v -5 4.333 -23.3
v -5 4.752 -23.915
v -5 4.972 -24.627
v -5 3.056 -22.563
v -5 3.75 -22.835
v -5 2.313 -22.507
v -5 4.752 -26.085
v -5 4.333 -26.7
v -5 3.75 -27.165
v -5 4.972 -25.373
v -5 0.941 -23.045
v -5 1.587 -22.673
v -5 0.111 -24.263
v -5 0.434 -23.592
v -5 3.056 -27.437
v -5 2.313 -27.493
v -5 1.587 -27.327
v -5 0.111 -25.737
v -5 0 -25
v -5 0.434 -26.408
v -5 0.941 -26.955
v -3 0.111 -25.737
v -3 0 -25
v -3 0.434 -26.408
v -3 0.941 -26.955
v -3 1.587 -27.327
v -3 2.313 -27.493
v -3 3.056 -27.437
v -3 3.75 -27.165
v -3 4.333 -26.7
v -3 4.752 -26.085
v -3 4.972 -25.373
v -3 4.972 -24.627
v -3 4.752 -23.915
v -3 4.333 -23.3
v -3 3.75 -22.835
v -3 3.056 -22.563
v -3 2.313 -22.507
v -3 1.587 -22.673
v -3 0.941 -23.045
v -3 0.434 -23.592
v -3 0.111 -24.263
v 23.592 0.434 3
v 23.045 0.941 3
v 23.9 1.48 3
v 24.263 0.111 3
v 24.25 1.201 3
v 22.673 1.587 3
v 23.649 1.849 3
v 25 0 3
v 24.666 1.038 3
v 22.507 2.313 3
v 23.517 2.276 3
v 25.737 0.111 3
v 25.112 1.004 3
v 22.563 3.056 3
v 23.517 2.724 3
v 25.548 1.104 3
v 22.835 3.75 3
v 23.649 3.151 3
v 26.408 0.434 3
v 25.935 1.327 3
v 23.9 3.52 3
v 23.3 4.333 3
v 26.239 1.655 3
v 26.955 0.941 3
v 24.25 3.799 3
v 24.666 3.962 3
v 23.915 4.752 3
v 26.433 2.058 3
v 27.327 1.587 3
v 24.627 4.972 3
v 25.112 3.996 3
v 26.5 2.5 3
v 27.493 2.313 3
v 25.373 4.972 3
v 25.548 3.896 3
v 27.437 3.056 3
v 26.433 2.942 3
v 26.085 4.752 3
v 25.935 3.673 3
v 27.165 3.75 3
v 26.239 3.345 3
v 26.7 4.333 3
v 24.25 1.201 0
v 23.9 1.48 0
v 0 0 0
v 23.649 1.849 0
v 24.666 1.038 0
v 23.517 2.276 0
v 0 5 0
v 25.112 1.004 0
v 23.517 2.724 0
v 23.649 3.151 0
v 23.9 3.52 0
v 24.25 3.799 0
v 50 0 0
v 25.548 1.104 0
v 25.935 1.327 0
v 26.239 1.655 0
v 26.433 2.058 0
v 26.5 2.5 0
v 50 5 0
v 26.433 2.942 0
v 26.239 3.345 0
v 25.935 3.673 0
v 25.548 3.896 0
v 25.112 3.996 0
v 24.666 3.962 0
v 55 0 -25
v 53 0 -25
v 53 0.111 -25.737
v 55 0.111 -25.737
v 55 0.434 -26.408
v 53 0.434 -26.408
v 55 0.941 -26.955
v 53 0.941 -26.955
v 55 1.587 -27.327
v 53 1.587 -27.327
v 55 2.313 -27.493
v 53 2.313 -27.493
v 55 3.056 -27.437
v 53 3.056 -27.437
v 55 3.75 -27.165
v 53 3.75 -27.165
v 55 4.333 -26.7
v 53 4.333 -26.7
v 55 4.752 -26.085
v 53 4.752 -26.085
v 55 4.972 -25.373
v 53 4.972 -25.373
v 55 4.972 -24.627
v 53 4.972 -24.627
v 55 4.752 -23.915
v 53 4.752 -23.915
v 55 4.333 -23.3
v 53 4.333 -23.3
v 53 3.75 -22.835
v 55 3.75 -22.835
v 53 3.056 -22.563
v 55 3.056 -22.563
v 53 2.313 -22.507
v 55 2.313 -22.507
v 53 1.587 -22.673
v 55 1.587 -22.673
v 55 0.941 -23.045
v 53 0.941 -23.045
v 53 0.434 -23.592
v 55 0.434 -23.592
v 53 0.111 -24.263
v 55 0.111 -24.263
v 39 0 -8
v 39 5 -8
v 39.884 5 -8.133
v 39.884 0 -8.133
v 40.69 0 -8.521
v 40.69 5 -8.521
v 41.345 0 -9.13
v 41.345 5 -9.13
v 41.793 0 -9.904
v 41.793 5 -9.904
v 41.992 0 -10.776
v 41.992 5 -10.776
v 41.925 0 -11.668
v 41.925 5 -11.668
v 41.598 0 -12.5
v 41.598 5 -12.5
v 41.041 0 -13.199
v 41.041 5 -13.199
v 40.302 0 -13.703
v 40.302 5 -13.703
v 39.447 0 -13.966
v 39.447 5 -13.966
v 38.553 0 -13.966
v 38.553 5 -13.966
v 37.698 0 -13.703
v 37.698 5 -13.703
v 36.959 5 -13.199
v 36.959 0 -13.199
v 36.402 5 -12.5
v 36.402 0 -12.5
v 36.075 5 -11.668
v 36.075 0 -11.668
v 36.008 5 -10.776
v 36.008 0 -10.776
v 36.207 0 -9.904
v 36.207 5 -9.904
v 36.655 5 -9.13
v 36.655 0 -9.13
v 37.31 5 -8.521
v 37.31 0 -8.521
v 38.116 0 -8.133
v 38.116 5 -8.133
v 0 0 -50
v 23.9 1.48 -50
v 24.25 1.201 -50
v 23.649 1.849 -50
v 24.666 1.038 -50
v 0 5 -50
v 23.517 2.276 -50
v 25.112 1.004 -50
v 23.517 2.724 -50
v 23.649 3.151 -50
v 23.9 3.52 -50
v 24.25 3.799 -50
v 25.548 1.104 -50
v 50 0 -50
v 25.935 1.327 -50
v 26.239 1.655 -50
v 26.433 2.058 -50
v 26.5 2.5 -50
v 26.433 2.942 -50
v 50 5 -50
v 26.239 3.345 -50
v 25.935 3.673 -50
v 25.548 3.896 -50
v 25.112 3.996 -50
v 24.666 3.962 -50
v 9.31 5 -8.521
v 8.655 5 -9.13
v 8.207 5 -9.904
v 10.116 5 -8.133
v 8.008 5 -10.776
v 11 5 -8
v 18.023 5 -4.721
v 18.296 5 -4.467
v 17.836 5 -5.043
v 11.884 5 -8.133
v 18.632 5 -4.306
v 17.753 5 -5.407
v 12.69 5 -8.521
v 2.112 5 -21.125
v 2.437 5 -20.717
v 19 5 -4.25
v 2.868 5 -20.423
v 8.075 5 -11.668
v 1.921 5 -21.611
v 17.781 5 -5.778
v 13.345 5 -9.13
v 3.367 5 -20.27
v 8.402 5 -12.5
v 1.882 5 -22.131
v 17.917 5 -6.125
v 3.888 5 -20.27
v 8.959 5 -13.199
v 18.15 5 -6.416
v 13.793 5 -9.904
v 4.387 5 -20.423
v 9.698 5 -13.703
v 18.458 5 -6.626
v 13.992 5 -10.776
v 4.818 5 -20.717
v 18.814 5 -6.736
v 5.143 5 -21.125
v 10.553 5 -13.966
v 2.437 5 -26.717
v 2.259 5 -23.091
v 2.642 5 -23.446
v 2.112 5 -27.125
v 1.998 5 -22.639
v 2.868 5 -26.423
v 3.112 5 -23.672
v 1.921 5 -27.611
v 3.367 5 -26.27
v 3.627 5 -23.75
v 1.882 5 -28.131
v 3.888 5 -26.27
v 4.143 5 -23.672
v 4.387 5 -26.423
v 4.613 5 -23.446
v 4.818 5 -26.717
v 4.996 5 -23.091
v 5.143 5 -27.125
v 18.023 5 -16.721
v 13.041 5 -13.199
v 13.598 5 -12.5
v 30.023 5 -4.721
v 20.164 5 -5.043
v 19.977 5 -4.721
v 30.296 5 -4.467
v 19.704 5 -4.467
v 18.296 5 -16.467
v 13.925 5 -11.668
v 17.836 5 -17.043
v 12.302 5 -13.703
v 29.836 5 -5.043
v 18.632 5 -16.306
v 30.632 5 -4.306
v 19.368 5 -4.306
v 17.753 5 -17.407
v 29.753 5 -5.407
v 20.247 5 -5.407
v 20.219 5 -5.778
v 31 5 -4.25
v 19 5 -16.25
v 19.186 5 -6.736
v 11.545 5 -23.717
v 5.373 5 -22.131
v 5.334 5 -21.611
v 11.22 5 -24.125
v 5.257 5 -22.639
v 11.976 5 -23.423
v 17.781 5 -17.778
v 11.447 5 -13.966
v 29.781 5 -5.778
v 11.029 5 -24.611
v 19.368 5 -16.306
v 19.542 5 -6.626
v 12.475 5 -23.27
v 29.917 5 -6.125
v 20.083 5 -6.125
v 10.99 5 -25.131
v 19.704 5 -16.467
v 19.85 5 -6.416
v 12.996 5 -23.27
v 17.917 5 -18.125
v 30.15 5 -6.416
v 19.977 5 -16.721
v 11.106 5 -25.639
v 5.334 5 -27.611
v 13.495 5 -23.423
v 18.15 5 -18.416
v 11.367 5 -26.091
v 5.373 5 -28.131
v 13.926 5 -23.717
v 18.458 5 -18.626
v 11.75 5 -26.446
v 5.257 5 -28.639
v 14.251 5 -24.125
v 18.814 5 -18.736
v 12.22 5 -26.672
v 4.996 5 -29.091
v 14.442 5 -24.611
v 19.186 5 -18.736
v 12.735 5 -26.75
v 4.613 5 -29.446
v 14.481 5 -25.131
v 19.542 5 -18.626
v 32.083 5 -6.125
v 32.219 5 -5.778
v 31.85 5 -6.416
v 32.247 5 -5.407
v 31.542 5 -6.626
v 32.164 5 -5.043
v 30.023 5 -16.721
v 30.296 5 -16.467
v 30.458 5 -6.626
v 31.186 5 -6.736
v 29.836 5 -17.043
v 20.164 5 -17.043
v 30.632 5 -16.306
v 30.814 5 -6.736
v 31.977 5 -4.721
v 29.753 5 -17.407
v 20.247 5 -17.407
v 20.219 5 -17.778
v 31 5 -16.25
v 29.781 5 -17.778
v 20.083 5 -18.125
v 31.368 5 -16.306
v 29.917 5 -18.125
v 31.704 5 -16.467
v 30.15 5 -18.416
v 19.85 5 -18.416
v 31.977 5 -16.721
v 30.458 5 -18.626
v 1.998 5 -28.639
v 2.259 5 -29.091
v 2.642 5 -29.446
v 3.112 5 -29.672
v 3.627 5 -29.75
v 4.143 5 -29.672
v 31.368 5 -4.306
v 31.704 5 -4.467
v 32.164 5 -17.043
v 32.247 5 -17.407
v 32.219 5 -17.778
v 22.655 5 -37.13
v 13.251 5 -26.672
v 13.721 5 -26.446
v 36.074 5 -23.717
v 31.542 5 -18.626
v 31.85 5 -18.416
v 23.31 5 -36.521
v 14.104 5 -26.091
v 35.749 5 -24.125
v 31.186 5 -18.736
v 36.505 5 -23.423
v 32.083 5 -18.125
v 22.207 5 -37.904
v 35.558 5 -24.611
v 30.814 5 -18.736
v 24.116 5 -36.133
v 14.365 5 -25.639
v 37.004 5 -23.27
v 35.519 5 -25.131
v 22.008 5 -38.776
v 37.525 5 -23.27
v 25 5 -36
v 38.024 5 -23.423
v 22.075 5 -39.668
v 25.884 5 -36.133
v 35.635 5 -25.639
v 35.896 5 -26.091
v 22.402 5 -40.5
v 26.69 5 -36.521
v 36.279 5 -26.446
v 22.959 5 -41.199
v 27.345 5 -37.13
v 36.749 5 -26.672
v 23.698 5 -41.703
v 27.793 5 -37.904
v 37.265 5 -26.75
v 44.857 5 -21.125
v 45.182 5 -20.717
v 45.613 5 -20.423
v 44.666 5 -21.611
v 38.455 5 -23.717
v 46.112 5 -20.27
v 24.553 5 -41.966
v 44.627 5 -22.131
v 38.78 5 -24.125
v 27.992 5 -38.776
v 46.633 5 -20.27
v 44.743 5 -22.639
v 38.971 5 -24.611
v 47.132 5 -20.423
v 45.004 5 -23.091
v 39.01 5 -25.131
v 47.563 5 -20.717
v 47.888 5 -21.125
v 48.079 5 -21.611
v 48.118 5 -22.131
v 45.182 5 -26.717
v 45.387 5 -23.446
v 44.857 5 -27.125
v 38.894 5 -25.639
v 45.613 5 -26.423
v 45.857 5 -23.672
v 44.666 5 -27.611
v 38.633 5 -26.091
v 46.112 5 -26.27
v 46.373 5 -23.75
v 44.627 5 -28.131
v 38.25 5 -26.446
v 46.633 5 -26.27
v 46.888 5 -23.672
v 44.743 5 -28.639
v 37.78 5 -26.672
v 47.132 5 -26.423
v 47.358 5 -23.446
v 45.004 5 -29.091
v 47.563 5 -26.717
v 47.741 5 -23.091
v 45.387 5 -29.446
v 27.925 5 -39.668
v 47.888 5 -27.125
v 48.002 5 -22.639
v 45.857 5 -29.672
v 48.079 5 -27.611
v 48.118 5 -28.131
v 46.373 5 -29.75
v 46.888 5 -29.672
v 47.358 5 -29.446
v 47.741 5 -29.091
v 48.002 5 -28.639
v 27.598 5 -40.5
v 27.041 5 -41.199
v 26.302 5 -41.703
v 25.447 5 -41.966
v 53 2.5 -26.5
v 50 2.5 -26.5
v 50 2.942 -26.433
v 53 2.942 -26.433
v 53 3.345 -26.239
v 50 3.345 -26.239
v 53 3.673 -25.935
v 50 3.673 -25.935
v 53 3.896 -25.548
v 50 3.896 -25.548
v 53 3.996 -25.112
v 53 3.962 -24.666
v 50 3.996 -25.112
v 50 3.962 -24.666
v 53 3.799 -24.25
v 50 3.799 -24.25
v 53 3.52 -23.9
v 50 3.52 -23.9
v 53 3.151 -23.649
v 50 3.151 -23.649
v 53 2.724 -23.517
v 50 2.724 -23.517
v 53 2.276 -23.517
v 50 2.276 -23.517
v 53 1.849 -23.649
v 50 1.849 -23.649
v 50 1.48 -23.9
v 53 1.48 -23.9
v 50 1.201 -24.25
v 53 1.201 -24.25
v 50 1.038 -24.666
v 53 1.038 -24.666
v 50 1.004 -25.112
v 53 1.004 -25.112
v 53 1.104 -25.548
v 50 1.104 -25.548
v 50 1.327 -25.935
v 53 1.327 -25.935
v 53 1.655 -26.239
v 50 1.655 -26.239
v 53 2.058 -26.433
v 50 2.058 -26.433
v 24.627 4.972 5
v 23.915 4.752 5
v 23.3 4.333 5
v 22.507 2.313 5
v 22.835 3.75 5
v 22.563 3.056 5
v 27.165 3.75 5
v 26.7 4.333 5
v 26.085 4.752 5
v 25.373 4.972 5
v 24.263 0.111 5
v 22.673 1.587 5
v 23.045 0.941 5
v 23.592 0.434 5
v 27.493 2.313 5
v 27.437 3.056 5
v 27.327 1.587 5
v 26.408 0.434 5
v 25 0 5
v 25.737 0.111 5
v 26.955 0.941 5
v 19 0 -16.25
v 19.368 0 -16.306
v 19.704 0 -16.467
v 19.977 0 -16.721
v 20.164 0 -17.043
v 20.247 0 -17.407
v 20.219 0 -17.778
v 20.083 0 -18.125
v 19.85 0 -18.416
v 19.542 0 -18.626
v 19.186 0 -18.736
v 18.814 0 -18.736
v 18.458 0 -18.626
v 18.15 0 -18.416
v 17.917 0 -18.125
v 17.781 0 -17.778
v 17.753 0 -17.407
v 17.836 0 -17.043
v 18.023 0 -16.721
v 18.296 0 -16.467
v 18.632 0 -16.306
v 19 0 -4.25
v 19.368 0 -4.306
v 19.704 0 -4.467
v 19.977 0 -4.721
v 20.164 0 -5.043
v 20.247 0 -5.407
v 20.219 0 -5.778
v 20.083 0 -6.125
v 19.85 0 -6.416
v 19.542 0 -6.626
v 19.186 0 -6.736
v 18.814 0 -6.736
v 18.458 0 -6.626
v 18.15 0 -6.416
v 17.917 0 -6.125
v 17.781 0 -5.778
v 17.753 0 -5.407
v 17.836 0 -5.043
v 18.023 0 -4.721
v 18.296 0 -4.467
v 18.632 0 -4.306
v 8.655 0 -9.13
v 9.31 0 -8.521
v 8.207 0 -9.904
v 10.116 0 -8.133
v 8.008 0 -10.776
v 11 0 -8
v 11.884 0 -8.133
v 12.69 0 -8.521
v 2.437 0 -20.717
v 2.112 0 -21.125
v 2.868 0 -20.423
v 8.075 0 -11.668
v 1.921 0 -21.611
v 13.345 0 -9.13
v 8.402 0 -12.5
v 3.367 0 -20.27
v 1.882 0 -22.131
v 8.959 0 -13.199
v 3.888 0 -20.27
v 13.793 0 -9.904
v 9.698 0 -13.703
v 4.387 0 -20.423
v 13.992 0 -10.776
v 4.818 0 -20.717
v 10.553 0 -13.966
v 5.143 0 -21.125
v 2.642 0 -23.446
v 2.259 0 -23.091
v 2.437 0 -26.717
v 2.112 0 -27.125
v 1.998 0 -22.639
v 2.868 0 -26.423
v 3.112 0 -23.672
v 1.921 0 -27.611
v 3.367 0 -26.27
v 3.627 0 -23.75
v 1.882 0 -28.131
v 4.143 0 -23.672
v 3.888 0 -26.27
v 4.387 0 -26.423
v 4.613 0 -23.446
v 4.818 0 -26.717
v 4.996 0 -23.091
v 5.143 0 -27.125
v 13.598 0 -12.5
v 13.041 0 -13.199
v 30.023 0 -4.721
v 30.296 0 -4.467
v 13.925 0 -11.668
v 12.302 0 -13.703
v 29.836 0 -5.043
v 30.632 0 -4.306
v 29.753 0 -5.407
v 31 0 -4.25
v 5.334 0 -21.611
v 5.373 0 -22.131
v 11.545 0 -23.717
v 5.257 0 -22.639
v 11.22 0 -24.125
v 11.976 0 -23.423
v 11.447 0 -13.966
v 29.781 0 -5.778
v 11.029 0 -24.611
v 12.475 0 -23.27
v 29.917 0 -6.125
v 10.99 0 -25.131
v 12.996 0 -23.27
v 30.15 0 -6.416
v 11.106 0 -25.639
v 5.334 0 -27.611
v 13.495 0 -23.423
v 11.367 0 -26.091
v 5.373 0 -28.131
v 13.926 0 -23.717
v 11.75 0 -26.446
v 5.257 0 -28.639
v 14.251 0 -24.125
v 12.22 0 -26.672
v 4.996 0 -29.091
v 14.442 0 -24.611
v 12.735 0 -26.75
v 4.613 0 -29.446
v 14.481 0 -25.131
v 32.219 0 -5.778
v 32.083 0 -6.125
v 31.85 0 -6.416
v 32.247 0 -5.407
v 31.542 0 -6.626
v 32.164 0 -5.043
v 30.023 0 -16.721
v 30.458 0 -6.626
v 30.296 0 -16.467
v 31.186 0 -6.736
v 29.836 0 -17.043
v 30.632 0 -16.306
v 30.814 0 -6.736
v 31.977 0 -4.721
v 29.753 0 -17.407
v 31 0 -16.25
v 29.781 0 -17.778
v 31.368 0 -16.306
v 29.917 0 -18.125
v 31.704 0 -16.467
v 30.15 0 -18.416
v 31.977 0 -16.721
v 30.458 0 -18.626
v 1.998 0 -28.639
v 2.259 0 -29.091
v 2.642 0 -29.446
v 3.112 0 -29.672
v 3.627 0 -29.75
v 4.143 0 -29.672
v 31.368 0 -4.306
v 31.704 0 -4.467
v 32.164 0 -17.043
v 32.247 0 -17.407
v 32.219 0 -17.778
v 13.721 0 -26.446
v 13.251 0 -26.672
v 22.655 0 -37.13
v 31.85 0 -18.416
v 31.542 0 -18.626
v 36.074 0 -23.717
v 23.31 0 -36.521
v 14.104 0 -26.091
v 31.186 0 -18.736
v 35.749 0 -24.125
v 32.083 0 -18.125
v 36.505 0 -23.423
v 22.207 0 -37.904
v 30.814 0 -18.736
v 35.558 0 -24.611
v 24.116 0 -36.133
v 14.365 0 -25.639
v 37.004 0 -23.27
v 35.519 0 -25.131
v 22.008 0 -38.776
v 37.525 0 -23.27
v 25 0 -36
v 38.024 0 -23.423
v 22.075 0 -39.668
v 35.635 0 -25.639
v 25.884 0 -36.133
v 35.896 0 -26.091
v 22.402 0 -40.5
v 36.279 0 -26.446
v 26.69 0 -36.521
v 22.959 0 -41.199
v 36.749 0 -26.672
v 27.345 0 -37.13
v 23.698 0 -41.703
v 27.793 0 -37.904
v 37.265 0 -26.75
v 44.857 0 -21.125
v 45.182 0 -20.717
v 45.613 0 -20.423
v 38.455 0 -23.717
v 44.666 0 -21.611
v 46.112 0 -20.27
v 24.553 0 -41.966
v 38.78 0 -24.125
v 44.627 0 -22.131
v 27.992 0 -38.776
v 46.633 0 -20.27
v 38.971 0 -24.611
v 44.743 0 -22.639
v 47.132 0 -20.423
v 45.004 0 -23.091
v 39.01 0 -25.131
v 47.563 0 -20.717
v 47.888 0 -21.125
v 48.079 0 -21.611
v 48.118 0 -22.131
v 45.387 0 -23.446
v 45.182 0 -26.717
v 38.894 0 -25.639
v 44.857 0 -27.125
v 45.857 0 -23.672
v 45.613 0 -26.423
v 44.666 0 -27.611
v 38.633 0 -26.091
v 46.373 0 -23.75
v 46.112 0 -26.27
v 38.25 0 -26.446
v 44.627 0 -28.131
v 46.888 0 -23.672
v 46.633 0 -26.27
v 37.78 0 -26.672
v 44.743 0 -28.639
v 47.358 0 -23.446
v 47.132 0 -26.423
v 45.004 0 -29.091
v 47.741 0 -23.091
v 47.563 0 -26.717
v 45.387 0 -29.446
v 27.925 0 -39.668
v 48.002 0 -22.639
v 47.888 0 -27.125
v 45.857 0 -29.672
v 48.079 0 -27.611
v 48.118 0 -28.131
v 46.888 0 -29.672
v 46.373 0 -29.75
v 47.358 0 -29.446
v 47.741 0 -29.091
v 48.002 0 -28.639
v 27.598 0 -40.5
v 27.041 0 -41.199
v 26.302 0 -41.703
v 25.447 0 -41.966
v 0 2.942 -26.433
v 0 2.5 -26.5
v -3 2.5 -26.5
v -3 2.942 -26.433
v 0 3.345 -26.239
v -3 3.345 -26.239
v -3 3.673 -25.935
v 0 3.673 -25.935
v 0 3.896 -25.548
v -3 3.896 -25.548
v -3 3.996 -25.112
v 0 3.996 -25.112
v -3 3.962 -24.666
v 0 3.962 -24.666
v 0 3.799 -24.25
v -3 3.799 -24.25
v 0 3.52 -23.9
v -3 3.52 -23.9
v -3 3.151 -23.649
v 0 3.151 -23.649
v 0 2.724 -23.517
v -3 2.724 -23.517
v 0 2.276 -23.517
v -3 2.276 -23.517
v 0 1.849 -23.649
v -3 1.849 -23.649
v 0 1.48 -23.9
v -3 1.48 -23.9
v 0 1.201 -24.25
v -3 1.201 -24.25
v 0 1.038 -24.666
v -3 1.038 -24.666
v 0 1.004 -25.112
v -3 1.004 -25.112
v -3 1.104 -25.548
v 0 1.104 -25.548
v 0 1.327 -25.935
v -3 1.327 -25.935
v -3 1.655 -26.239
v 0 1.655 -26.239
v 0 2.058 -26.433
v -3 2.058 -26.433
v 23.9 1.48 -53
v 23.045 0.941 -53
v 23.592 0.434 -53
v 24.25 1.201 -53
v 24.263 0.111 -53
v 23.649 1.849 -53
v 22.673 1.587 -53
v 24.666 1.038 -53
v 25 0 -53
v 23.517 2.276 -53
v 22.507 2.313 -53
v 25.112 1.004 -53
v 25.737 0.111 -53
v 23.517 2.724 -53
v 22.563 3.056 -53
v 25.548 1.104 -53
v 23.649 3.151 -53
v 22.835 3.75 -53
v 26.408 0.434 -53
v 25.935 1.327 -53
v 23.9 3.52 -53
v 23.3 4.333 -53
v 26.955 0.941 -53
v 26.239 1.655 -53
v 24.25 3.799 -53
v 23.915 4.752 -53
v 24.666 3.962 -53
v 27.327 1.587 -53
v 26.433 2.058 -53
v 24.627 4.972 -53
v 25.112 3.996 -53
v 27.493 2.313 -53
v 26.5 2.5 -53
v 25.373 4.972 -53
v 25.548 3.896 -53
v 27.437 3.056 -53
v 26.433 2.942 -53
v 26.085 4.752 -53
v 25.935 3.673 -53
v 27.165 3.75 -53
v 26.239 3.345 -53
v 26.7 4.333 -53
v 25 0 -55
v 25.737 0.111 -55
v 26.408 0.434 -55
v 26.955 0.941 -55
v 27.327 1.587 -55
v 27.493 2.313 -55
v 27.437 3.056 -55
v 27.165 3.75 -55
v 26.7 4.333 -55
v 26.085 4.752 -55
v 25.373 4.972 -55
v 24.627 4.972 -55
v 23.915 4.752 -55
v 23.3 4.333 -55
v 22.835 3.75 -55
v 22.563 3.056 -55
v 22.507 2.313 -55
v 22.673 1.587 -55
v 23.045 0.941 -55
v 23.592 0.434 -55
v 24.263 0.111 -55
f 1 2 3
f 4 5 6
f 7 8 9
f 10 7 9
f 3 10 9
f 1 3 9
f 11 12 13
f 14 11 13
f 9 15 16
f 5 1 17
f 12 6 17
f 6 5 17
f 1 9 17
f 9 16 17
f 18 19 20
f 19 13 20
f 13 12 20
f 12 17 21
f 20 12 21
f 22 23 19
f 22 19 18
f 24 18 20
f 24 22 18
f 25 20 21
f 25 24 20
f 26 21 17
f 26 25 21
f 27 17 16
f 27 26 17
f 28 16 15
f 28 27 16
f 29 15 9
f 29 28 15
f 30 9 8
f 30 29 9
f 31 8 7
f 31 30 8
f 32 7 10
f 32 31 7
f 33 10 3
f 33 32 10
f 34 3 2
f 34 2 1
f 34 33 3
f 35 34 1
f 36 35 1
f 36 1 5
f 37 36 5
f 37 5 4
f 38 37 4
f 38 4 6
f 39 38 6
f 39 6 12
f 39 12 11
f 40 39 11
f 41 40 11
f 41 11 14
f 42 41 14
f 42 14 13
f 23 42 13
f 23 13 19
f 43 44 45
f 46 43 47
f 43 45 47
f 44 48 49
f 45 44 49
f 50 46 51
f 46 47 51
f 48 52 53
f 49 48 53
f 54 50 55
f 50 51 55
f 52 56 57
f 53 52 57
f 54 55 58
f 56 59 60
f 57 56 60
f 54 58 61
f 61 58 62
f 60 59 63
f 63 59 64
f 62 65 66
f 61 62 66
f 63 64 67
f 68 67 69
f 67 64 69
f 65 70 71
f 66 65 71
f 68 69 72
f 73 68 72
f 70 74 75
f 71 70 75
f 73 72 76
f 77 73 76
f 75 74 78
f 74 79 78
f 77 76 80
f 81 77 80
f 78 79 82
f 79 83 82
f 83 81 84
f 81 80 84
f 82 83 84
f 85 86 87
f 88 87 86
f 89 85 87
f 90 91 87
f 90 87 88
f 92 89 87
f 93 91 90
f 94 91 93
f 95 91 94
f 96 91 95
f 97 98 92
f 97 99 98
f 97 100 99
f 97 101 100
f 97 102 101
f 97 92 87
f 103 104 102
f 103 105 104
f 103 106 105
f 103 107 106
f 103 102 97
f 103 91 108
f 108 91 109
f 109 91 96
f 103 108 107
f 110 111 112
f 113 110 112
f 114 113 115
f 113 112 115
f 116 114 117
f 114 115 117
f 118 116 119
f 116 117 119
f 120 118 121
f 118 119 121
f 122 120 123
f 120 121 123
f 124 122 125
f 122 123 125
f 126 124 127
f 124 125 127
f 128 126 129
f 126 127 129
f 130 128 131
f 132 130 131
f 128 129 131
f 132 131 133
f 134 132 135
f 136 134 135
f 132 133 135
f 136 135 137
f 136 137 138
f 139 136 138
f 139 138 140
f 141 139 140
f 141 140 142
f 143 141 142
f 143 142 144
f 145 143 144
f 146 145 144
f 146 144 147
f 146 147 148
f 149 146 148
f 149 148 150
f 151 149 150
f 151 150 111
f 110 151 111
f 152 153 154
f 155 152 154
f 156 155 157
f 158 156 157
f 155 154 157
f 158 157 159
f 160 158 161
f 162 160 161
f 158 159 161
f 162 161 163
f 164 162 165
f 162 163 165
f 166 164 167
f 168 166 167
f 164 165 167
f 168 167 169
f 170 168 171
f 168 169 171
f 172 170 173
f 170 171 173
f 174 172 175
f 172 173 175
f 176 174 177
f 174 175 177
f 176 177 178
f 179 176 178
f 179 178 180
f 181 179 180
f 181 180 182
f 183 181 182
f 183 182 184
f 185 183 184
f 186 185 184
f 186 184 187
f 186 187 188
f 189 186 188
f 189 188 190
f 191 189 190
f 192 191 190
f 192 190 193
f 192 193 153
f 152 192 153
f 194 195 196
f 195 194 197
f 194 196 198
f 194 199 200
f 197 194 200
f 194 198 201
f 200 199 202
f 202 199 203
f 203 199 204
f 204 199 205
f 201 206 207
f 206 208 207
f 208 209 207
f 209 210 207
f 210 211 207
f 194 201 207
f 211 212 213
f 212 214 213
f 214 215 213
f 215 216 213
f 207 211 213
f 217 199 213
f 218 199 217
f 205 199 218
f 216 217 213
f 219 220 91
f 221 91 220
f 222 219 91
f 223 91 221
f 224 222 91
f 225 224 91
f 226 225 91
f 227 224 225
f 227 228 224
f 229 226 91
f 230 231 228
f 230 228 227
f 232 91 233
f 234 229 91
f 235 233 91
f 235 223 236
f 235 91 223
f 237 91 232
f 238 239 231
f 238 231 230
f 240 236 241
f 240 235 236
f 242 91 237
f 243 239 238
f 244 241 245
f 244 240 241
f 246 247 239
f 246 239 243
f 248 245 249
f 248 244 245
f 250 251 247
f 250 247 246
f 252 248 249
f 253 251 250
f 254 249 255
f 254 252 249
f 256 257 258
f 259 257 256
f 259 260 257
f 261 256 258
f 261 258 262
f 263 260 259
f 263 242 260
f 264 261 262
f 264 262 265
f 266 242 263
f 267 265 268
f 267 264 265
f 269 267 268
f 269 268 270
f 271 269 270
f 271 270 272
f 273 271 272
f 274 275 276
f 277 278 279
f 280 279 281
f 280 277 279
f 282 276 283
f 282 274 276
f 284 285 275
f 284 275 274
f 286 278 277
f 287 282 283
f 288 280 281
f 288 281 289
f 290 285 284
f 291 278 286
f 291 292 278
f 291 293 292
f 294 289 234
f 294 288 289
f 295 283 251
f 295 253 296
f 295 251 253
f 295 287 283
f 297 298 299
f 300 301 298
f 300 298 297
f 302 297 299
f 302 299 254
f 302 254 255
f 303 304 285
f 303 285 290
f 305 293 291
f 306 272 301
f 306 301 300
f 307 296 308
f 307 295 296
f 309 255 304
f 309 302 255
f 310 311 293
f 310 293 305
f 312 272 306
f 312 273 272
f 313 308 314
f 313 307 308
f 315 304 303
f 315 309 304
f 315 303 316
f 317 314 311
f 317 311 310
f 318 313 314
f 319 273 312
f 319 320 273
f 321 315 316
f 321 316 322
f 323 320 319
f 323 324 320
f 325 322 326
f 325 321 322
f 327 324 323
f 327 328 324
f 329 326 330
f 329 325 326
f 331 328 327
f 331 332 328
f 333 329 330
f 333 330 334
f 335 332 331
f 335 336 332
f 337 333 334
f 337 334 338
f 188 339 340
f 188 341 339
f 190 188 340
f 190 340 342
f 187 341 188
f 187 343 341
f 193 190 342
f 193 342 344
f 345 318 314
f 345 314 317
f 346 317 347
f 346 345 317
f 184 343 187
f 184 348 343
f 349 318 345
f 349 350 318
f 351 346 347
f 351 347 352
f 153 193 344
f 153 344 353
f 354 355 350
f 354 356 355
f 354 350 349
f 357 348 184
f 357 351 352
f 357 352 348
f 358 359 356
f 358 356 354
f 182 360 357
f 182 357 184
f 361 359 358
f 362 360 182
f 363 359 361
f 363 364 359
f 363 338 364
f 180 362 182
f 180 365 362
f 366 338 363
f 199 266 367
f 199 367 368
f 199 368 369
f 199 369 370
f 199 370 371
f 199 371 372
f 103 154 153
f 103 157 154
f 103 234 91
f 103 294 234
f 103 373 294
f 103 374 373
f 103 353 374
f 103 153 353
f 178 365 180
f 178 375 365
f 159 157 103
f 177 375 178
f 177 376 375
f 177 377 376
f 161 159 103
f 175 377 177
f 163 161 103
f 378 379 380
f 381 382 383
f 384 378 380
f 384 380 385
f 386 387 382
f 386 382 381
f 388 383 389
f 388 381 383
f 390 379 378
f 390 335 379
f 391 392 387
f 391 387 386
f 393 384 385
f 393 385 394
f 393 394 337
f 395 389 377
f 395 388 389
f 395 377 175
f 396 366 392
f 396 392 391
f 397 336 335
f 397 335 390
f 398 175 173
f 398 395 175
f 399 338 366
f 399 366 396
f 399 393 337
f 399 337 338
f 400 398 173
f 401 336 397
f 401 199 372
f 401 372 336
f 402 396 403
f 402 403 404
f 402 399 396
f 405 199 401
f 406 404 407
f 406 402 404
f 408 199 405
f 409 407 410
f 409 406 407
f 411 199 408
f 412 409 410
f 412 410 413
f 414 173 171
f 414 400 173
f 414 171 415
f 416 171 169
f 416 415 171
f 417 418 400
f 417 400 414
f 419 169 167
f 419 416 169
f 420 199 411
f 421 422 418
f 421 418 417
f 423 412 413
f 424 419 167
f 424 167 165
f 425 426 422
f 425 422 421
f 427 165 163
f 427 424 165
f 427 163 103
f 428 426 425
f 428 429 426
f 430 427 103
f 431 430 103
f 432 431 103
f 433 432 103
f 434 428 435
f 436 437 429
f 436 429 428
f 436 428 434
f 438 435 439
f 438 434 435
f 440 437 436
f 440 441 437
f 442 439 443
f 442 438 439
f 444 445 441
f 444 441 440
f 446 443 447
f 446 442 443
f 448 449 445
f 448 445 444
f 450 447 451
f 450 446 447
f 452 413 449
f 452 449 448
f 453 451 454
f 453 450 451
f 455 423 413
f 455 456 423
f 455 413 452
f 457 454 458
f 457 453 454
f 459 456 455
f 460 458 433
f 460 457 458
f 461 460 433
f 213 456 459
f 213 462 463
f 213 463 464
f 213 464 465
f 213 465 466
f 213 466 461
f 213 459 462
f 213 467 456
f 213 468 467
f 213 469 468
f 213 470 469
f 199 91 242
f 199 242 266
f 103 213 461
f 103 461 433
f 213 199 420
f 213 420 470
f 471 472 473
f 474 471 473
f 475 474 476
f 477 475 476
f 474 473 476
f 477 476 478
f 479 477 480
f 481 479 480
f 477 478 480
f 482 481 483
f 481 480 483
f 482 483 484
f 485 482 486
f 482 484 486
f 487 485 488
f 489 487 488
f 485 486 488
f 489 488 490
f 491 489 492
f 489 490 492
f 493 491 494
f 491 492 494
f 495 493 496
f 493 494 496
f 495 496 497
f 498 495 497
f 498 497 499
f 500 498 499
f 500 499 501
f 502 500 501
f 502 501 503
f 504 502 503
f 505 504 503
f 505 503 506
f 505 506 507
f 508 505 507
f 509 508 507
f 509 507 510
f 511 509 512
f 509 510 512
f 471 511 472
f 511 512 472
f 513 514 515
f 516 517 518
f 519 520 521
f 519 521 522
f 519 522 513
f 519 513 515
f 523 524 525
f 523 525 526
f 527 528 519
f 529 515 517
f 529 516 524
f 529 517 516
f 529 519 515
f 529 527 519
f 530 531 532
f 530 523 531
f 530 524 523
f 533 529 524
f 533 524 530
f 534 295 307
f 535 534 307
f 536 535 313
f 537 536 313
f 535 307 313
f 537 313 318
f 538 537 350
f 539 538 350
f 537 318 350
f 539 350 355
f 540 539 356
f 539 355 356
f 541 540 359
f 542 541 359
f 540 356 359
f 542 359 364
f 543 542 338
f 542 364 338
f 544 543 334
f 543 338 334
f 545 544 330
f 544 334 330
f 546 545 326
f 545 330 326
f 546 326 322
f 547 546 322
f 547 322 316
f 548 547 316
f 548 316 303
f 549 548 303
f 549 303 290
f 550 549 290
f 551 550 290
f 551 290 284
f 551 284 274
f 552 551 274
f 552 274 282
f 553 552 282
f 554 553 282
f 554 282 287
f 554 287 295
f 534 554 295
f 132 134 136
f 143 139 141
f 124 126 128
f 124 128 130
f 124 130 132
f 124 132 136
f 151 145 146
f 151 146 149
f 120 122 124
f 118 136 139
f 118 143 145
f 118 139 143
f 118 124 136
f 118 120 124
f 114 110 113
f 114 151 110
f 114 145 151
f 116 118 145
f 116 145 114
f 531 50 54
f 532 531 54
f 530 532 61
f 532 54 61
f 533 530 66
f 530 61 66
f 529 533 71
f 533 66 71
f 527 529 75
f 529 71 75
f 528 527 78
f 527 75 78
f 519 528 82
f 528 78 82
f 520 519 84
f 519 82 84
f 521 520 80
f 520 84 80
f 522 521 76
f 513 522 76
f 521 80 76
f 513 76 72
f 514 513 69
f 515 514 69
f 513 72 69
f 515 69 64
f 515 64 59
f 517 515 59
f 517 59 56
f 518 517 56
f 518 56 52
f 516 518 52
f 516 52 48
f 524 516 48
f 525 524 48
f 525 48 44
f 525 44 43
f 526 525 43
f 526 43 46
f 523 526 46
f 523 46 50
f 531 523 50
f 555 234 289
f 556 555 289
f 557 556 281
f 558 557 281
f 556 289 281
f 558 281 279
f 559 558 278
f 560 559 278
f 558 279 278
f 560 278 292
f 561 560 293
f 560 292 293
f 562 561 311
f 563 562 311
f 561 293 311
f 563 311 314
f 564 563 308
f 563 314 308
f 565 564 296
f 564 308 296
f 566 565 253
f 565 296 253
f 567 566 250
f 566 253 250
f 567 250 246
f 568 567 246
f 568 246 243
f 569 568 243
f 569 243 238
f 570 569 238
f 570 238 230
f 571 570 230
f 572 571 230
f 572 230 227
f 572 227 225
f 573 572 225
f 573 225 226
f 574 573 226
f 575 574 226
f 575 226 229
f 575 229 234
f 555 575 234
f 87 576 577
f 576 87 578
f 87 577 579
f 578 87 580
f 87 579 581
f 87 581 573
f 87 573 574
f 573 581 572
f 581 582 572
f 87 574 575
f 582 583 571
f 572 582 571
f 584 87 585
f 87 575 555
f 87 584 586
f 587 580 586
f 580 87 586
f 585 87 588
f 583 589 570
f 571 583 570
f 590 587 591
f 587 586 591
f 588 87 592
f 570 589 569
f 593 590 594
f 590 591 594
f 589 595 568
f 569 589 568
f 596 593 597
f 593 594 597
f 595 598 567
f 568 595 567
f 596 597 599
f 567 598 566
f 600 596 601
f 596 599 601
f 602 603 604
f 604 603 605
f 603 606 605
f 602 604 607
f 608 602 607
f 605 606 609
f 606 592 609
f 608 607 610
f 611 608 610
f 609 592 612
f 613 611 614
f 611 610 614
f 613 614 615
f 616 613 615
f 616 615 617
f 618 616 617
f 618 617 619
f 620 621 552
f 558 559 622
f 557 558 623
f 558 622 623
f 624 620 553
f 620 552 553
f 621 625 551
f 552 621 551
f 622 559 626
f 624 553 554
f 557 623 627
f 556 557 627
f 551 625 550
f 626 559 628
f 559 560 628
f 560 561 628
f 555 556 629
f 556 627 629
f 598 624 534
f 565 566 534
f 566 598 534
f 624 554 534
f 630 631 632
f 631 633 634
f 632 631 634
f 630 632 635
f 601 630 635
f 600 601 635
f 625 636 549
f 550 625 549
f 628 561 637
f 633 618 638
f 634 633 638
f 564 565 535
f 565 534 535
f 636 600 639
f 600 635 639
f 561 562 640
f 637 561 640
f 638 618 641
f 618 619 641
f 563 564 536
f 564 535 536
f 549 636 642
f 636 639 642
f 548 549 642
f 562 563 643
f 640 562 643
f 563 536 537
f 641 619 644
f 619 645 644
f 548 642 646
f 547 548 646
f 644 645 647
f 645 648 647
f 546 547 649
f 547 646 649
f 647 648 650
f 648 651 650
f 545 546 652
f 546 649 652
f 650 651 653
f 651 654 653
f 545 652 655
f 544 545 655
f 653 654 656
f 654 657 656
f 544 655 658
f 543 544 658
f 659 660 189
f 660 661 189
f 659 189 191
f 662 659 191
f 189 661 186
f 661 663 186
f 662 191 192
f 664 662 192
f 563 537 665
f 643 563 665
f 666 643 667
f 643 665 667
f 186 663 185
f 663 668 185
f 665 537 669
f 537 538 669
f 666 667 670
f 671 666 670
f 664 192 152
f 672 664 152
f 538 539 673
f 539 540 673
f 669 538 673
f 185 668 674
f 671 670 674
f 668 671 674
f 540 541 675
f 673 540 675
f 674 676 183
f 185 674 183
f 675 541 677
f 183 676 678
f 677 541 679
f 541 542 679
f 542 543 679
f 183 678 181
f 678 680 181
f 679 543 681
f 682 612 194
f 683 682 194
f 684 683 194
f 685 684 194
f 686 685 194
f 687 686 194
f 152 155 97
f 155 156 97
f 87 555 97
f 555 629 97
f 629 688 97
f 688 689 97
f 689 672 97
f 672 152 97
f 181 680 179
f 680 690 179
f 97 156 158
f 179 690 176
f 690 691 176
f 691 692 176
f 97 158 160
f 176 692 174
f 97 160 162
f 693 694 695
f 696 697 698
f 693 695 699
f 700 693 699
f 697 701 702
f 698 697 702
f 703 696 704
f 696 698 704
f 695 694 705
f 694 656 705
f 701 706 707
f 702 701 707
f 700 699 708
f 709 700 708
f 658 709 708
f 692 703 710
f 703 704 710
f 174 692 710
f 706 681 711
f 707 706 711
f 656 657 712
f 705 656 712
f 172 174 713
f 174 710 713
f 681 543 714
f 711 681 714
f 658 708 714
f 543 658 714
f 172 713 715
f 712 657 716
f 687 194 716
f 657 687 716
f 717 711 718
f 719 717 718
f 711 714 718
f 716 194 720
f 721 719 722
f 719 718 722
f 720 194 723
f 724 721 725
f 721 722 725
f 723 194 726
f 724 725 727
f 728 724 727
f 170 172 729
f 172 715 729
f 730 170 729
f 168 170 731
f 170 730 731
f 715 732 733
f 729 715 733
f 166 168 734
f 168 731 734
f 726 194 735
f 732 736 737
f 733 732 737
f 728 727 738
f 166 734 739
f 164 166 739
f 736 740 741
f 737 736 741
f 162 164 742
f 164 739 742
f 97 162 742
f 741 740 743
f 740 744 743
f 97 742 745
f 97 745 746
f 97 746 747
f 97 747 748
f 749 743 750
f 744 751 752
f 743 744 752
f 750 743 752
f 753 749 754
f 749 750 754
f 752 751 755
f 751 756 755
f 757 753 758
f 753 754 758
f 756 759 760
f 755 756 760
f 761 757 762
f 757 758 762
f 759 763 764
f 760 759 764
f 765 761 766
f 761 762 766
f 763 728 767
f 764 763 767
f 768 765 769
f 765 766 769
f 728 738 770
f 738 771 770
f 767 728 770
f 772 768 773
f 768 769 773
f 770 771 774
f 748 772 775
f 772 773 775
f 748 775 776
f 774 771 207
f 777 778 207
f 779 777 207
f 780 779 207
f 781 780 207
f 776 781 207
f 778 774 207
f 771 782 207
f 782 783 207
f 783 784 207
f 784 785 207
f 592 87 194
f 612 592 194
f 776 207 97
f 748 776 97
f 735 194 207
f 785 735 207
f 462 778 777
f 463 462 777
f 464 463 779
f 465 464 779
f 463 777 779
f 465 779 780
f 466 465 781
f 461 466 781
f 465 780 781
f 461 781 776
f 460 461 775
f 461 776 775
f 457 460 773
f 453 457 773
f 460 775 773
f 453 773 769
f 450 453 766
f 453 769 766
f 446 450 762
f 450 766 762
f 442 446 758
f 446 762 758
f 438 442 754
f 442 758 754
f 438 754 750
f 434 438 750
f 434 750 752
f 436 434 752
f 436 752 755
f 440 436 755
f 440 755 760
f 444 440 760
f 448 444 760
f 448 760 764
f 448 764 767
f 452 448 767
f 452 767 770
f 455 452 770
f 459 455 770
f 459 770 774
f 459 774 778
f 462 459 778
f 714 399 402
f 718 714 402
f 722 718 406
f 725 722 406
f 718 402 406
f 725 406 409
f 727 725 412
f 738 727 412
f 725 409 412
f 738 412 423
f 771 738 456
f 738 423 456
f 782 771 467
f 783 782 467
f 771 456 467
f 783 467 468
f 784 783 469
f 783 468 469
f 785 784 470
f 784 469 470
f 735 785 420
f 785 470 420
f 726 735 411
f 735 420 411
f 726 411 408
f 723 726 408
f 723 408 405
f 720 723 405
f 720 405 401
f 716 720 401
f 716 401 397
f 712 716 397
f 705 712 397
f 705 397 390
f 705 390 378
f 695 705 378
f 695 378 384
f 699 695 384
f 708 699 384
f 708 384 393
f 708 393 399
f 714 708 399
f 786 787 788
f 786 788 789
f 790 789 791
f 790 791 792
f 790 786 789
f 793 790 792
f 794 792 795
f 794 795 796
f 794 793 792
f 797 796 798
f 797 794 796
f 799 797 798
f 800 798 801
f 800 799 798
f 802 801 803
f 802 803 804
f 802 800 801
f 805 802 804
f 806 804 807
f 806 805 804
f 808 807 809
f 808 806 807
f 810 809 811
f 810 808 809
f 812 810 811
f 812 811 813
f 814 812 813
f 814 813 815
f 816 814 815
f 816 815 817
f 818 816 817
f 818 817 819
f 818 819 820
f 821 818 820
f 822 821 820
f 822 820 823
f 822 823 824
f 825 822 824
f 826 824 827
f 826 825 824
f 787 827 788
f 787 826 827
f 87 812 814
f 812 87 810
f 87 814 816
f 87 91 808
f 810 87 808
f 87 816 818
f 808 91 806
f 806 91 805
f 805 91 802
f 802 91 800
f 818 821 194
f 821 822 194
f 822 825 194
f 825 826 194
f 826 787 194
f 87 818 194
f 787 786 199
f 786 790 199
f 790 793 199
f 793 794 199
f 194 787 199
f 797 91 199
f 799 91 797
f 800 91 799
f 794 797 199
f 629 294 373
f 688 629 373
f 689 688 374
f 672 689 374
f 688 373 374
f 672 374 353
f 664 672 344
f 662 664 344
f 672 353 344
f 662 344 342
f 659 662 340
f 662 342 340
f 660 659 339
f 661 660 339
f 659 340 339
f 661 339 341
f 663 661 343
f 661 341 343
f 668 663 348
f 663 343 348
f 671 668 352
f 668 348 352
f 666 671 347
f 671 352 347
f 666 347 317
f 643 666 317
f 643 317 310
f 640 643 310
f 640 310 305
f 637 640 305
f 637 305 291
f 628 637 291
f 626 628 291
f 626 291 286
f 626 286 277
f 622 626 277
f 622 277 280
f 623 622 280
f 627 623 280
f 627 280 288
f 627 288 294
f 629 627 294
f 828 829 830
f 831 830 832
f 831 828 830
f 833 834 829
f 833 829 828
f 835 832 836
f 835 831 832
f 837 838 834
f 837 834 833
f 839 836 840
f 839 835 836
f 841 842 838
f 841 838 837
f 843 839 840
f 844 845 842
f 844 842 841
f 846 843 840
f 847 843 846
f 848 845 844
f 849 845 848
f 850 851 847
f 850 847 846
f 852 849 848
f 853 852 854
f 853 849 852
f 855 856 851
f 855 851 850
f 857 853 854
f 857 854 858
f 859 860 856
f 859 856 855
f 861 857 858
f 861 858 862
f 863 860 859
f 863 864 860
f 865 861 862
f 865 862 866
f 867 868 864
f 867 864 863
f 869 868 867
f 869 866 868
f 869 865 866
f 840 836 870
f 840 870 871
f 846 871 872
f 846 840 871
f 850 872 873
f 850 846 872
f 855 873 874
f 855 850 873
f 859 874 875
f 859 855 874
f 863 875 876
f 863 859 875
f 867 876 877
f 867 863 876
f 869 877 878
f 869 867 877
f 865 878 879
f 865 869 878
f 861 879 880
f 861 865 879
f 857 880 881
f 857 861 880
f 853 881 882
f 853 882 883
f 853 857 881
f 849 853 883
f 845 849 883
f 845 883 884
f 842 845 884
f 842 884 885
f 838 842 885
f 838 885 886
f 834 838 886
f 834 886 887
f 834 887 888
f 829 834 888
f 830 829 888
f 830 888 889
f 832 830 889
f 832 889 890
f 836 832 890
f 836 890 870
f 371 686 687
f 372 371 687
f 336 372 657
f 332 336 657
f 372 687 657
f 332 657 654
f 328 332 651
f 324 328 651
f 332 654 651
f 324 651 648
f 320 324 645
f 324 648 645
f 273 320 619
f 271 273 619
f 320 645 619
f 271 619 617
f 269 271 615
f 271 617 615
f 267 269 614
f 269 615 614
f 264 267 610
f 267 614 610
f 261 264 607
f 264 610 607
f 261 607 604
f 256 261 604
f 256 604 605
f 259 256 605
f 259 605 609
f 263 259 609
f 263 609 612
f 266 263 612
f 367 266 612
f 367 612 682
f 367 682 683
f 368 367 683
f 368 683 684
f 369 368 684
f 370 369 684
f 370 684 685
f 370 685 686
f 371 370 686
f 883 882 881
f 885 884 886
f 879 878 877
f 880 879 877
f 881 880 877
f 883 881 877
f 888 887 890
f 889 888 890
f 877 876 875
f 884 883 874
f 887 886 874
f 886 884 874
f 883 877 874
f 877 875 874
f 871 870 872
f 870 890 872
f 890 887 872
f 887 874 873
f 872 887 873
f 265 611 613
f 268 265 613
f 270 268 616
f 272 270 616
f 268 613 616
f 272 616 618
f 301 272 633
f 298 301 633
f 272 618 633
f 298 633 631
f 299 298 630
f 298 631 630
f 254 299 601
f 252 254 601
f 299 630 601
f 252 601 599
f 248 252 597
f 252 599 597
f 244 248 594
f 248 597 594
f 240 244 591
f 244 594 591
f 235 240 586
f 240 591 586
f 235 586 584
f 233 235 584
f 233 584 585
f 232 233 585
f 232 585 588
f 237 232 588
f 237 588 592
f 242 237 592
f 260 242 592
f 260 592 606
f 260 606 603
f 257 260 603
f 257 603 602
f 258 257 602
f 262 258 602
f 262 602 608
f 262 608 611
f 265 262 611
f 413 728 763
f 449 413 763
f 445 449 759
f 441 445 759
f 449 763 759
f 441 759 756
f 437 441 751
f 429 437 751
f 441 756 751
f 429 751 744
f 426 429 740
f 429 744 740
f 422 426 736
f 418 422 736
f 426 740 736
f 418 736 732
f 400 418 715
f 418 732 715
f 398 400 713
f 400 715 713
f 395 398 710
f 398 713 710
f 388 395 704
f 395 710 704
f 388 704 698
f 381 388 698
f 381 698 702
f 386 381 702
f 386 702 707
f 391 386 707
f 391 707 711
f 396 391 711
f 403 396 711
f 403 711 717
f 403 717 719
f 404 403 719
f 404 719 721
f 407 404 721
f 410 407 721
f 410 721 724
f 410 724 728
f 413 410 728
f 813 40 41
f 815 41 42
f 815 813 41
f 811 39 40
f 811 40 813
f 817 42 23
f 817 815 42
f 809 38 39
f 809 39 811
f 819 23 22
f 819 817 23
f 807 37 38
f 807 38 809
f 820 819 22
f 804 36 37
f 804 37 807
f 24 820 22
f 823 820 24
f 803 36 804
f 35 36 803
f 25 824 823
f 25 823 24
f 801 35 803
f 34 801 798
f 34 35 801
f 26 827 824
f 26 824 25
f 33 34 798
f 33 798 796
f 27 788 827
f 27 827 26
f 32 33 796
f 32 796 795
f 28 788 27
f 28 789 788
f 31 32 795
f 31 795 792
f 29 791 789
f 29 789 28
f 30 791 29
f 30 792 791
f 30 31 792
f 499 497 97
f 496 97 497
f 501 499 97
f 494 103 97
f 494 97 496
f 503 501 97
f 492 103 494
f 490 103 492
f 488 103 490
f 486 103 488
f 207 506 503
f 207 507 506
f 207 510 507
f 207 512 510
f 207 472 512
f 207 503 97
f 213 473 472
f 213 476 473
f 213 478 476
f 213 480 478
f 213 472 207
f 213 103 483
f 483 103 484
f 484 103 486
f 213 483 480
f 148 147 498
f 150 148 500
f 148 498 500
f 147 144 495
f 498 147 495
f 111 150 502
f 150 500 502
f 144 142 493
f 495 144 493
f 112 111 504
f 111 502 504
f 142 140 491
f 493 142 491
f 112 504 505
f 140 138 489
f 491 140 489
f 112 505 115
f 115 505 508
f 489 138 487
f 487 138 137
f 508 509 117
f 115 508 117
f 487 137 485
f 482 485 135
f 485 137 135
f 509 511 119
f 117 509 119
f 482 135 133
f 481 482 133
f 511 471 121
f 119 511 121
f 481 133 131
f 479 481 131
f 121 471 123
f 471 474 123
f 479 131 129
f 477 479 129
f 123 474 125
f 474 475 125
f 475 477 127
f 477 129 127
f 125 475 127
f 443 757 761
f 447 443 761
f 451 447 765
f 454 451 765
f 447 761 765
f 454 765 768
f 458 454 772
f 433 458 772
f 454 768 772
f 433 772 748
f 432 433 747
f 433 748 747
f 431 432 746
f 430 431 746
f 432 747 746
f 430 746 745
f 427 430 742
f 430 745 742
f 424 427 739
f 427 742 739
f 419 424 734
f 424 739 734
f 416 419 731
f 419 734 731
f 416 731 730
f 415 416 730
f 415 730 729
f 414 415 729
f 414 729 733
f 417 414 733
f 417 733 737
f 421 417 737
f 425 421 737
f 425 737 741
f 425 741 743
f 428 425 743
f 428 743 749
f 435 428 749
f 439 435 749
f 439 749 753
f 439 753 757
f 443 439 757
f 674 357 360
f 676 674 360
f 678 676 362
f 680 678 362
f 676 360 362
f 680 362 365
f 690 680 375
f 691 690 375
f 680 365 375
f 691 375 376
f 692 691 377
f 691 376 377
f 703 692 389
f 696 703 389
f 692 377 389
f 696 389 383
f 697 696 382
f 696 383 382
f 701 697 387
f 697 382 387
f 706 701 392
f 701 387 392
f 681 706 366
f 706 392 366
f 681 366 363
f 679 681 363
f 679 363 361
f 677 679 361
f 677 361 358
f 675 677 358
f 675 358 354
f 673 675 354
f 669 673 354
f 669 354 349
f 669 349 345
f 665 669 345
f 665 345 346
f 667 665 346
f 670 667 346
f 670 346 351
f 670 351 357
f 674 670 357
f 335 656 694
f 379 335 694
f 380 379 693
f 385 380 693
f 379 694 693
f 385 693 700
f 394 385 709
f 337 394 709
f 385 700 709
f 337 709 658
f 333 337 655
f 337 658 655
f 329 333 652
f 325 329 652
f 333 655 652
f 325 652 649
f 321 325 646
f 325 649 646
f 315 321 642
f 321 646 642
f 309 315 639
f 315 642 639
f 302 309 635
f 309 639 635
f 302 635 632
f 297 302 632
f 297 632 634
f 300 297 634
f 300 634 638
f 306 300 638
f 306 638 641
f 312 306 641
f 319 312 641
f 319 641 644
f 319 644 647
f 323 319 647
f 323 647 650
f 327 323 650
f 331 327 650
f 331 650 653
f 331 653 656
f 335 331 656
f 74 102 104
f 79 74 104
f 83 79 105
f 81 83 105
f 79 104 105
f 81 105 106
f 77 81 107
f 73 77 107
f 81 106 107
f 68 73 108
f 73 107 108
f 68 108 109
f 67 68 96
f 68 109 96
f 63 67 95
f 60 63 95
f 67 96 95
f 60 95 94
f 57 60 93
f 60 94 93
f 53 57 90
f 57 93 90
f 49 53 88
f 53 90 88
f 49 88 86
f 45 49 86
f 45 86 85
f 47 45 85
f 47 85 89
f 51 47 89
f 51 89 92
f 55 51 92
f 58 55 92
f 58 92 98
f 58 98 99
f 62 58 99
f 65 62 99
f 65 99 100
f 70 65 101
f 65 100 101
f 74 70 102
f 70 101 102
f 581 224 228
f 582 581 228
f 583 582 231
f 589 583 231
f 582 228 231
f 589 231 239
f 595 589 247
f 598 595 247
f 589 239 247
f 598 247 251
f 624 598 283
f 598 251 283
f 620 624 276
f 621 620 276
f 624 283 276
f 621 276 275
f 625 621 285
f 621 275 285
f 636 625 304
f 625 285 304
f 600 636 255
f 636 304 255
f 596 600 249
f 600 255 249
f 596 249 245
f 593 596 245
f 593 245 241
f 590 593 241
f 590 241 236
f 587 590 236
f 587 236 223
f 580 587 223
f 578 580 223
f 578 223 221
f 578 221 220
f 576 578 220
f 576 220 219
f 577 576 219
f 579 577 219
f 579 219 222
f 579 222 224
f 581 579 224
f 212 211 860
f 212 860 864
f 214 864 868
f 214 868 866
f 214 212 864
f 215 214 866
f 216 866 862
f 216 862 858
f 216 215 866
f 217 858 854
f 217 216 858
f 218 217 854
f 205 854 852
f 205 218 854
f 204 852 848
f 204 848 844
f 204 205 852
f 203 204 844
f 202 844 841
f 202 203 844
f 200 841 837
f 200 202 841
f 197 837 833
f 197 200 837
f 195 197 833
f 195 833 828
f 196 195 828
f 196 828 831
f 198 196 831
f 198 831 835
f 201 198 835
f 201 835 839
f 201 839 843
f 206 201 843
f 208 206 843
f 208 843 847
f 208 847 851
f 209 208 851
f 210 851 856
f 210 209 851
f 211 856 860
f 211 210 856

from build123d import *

# Parameters (mm, degrees)
SKETCH_1_W          = 50
SKETCH_1_H          = 50
EXTRUDE_1_DEPTH     = 5
SKETCH_2_R          = 3
CUT_EXTRUDE_1_DEPTH = 71.887234394
SKETCH_3_R          = 1.25
CUT_EXTRUDE_2_DEPTH = 71.887234394
SKETCH_8_R          = 1.75
CUT_EXTRUDE_4_DEPTH = 71.887234394
SKETCH_9_R          = 2.5
EXTRUDE_2_DEPTH     = 5
SKETCH_10_R         = 2.5
SKETCH_10_R_2       = 1.5
CUT_EXTRUDE_5_DEPTH = 3
SKETCH_11_R         = 2.5
EXTRUDE_3_DEPTH     = 5
SKETCH_12_R         = 2.5
SKETCH_12_R_2       = 1.5
CUT_EXTRUDE_7_DEPTH = 3


with BuildPart() as part:
    # 草图1 → 凸台-拉伸1 (new body)
    with BuildSketch(Plane(origin=(0, 0, 0), x_dir=(1, 0, 0), z_dir=(0, 1, 0))):
        with Locations((25, 25)):
            Rectangle(SKETCH_1_W, SKETCH_1_H)
    extrude(amount=EXTRUDE_1_DEPTH)

    # 草图2 → 切除-拉伸1 (cut, through all)
    with BuildSketch(Plane(origin=(0, 5, 0), x_dir=(1, 0, 0), z_dir=(0, 1, 0))):
        with Locations(Location((25, 39, 0), (0, 0, 270))):
            Circle(SKETCH_2_R)
        with Locations(Location((11, 11, 0), (0, 0, 270))):
            Circle(SKETCH_2_R)
        with Locations(Location((39, 11, 0), (0, 0, 270))):
            Circle(SKETCH_2_R)
    extrude(amount=-CUT_EXTRUDE_1_DEPTH, mode=Mode.SUBTRACT)

    # 草图3 → 切除-拉伸2 (cut, through all)
    with BuildSketch(Plane(origin=(0, 5, 0), x_dir=(1, 0, 0), z_dir=(0, 1, 0))):
        with Locations(Location((19, 17.5, 0), (0, 0, 270))):
            Circle(SKETCH_3_R)
        with Locations(Location((31, 17.5, 0), (0, 0, 270))):
            Circle(SKETCH_3_R)
        with Locations(Location((19, 5.5, 0), (0, 0, 270))):
            Circle(SKETCH_3_R)
        with Locations(Location((31, 5.5, 0), (0, 0, 270))):
            Circle(SKETCH_3_R)
    extrude(amount=-CUT_EXTRUDE_2_DEPTH, mode=Mode.SUBTRACT)

    # 草图8 → 切除-拉伸4 (cut, through all)
    with BuildSketch(Plane.XZ):
        with Locations(Location((46.372516673, -22, 0), (0, 0, 270))):
            Circle(SKETCH_8_R)
        with Locations(Location((46.372516673, -28, 0), (0, 0, 270))):
            Circle(SKETCH_8_R)
        with Locations(Location((37.264513071, -25, 0), (0, 0, 270))):
            Circle(SKETCH_8_R)
        with Locations(Location((12.735486929, -25, 0), (0, 0, 270))):
            Circle(SKETCH_8_R)
        with Locations(Location((3.627483327, -28, 0), (0, 0, 270))):
            Circle(SKETCH_8_R)
        with Locations(Location((3.627483327, -22, 0), (0, 0, 270))):
            Circle(SKETCH_8_R)
    extrude(amount=-CUT_EXTRUDE_4_DEPTH, mode=Mode.SUBTRACT)

    # 草图9 → 凸台-拉伸2 (add)
    with BuildSketch(Plane.XY):
        with Locations(Location((25, 2.5, 0), (0, 0, 270))):
            Circle(SKETCH_9_R)
    extrude_2 = extrude(amount=EXTRUDE_2_DEPTH)

    # 草图10 → 切除-拉伸5 (cut)
    with BuildSketch(Plane.XY):
        with Locations((25, 2.5)):
            Circle(SKETCH_10_R)
        with Locations((25, 2.5)):
            Circle(SKETCH_10_R_2, mode=Mode.SUBTRACT)
    cut_extrude_5 = extrude(amount=CUT_EXTRUDE_5_DEPTH, mode=Mode.SUBTRACT)

    # 草图11 → 凸台-拉伸3 (add)
    with BuildSketch(Plane(origin=(50, 0, 0), x_dir=(0, 0, -1), z_dir=(1, 0, 0))):
        with Locations(Location((25, 2.5, 0), (0, 0, 270))):
            Circle(SKETCH_11_R)
    extrude_3 = extrude(amount=EXTRUDE_3_DEPTH)

    # 草图12 → 切除-拉伸7 (cut)
    with BuildSketch(Plane(origin=(50, 0, 0), x_dir=(0, 0, -1), z_dir=(1, 0, 0))):
        with Locations((25, 2.5)):
            Circle(SKETCH_12_R)
        with Locations((25, 2.5)):
            Circle(SKETCH_12_R_2, mode=Mode.SUBTRACT)
    cut_extrude_7 = extrude(amount=CUT_EXTRUDE_7_DEPTH, mode=Mode.SUBTRACT)

    # 镜向1: 凸台-拉伸3, 切除-拉伸7 across plane
    add(extrude_3.mirror(Plane.ZY.offset(-25)))
    add(cut_extrude_7.mirror(Plane.ZY.offset(-25)), mode=Mode.SUBTRACT)

    # 镜向2: 凸台-拉伸2, 切除-拉伸5 across plane
    add(extrude_2.mirror(Plane(origin=(0, 0, -25), x_dir=(1, 0, 0), z_dir=(0, 0, -1))))
    add(cut_extrude_5.mirror(Plane(origin=(0, 0, -25), x_dir=(1, 0, 0), z_dir=(0, 0, -1))), mode=Mode.SUBTRACT)


solid = part.part
